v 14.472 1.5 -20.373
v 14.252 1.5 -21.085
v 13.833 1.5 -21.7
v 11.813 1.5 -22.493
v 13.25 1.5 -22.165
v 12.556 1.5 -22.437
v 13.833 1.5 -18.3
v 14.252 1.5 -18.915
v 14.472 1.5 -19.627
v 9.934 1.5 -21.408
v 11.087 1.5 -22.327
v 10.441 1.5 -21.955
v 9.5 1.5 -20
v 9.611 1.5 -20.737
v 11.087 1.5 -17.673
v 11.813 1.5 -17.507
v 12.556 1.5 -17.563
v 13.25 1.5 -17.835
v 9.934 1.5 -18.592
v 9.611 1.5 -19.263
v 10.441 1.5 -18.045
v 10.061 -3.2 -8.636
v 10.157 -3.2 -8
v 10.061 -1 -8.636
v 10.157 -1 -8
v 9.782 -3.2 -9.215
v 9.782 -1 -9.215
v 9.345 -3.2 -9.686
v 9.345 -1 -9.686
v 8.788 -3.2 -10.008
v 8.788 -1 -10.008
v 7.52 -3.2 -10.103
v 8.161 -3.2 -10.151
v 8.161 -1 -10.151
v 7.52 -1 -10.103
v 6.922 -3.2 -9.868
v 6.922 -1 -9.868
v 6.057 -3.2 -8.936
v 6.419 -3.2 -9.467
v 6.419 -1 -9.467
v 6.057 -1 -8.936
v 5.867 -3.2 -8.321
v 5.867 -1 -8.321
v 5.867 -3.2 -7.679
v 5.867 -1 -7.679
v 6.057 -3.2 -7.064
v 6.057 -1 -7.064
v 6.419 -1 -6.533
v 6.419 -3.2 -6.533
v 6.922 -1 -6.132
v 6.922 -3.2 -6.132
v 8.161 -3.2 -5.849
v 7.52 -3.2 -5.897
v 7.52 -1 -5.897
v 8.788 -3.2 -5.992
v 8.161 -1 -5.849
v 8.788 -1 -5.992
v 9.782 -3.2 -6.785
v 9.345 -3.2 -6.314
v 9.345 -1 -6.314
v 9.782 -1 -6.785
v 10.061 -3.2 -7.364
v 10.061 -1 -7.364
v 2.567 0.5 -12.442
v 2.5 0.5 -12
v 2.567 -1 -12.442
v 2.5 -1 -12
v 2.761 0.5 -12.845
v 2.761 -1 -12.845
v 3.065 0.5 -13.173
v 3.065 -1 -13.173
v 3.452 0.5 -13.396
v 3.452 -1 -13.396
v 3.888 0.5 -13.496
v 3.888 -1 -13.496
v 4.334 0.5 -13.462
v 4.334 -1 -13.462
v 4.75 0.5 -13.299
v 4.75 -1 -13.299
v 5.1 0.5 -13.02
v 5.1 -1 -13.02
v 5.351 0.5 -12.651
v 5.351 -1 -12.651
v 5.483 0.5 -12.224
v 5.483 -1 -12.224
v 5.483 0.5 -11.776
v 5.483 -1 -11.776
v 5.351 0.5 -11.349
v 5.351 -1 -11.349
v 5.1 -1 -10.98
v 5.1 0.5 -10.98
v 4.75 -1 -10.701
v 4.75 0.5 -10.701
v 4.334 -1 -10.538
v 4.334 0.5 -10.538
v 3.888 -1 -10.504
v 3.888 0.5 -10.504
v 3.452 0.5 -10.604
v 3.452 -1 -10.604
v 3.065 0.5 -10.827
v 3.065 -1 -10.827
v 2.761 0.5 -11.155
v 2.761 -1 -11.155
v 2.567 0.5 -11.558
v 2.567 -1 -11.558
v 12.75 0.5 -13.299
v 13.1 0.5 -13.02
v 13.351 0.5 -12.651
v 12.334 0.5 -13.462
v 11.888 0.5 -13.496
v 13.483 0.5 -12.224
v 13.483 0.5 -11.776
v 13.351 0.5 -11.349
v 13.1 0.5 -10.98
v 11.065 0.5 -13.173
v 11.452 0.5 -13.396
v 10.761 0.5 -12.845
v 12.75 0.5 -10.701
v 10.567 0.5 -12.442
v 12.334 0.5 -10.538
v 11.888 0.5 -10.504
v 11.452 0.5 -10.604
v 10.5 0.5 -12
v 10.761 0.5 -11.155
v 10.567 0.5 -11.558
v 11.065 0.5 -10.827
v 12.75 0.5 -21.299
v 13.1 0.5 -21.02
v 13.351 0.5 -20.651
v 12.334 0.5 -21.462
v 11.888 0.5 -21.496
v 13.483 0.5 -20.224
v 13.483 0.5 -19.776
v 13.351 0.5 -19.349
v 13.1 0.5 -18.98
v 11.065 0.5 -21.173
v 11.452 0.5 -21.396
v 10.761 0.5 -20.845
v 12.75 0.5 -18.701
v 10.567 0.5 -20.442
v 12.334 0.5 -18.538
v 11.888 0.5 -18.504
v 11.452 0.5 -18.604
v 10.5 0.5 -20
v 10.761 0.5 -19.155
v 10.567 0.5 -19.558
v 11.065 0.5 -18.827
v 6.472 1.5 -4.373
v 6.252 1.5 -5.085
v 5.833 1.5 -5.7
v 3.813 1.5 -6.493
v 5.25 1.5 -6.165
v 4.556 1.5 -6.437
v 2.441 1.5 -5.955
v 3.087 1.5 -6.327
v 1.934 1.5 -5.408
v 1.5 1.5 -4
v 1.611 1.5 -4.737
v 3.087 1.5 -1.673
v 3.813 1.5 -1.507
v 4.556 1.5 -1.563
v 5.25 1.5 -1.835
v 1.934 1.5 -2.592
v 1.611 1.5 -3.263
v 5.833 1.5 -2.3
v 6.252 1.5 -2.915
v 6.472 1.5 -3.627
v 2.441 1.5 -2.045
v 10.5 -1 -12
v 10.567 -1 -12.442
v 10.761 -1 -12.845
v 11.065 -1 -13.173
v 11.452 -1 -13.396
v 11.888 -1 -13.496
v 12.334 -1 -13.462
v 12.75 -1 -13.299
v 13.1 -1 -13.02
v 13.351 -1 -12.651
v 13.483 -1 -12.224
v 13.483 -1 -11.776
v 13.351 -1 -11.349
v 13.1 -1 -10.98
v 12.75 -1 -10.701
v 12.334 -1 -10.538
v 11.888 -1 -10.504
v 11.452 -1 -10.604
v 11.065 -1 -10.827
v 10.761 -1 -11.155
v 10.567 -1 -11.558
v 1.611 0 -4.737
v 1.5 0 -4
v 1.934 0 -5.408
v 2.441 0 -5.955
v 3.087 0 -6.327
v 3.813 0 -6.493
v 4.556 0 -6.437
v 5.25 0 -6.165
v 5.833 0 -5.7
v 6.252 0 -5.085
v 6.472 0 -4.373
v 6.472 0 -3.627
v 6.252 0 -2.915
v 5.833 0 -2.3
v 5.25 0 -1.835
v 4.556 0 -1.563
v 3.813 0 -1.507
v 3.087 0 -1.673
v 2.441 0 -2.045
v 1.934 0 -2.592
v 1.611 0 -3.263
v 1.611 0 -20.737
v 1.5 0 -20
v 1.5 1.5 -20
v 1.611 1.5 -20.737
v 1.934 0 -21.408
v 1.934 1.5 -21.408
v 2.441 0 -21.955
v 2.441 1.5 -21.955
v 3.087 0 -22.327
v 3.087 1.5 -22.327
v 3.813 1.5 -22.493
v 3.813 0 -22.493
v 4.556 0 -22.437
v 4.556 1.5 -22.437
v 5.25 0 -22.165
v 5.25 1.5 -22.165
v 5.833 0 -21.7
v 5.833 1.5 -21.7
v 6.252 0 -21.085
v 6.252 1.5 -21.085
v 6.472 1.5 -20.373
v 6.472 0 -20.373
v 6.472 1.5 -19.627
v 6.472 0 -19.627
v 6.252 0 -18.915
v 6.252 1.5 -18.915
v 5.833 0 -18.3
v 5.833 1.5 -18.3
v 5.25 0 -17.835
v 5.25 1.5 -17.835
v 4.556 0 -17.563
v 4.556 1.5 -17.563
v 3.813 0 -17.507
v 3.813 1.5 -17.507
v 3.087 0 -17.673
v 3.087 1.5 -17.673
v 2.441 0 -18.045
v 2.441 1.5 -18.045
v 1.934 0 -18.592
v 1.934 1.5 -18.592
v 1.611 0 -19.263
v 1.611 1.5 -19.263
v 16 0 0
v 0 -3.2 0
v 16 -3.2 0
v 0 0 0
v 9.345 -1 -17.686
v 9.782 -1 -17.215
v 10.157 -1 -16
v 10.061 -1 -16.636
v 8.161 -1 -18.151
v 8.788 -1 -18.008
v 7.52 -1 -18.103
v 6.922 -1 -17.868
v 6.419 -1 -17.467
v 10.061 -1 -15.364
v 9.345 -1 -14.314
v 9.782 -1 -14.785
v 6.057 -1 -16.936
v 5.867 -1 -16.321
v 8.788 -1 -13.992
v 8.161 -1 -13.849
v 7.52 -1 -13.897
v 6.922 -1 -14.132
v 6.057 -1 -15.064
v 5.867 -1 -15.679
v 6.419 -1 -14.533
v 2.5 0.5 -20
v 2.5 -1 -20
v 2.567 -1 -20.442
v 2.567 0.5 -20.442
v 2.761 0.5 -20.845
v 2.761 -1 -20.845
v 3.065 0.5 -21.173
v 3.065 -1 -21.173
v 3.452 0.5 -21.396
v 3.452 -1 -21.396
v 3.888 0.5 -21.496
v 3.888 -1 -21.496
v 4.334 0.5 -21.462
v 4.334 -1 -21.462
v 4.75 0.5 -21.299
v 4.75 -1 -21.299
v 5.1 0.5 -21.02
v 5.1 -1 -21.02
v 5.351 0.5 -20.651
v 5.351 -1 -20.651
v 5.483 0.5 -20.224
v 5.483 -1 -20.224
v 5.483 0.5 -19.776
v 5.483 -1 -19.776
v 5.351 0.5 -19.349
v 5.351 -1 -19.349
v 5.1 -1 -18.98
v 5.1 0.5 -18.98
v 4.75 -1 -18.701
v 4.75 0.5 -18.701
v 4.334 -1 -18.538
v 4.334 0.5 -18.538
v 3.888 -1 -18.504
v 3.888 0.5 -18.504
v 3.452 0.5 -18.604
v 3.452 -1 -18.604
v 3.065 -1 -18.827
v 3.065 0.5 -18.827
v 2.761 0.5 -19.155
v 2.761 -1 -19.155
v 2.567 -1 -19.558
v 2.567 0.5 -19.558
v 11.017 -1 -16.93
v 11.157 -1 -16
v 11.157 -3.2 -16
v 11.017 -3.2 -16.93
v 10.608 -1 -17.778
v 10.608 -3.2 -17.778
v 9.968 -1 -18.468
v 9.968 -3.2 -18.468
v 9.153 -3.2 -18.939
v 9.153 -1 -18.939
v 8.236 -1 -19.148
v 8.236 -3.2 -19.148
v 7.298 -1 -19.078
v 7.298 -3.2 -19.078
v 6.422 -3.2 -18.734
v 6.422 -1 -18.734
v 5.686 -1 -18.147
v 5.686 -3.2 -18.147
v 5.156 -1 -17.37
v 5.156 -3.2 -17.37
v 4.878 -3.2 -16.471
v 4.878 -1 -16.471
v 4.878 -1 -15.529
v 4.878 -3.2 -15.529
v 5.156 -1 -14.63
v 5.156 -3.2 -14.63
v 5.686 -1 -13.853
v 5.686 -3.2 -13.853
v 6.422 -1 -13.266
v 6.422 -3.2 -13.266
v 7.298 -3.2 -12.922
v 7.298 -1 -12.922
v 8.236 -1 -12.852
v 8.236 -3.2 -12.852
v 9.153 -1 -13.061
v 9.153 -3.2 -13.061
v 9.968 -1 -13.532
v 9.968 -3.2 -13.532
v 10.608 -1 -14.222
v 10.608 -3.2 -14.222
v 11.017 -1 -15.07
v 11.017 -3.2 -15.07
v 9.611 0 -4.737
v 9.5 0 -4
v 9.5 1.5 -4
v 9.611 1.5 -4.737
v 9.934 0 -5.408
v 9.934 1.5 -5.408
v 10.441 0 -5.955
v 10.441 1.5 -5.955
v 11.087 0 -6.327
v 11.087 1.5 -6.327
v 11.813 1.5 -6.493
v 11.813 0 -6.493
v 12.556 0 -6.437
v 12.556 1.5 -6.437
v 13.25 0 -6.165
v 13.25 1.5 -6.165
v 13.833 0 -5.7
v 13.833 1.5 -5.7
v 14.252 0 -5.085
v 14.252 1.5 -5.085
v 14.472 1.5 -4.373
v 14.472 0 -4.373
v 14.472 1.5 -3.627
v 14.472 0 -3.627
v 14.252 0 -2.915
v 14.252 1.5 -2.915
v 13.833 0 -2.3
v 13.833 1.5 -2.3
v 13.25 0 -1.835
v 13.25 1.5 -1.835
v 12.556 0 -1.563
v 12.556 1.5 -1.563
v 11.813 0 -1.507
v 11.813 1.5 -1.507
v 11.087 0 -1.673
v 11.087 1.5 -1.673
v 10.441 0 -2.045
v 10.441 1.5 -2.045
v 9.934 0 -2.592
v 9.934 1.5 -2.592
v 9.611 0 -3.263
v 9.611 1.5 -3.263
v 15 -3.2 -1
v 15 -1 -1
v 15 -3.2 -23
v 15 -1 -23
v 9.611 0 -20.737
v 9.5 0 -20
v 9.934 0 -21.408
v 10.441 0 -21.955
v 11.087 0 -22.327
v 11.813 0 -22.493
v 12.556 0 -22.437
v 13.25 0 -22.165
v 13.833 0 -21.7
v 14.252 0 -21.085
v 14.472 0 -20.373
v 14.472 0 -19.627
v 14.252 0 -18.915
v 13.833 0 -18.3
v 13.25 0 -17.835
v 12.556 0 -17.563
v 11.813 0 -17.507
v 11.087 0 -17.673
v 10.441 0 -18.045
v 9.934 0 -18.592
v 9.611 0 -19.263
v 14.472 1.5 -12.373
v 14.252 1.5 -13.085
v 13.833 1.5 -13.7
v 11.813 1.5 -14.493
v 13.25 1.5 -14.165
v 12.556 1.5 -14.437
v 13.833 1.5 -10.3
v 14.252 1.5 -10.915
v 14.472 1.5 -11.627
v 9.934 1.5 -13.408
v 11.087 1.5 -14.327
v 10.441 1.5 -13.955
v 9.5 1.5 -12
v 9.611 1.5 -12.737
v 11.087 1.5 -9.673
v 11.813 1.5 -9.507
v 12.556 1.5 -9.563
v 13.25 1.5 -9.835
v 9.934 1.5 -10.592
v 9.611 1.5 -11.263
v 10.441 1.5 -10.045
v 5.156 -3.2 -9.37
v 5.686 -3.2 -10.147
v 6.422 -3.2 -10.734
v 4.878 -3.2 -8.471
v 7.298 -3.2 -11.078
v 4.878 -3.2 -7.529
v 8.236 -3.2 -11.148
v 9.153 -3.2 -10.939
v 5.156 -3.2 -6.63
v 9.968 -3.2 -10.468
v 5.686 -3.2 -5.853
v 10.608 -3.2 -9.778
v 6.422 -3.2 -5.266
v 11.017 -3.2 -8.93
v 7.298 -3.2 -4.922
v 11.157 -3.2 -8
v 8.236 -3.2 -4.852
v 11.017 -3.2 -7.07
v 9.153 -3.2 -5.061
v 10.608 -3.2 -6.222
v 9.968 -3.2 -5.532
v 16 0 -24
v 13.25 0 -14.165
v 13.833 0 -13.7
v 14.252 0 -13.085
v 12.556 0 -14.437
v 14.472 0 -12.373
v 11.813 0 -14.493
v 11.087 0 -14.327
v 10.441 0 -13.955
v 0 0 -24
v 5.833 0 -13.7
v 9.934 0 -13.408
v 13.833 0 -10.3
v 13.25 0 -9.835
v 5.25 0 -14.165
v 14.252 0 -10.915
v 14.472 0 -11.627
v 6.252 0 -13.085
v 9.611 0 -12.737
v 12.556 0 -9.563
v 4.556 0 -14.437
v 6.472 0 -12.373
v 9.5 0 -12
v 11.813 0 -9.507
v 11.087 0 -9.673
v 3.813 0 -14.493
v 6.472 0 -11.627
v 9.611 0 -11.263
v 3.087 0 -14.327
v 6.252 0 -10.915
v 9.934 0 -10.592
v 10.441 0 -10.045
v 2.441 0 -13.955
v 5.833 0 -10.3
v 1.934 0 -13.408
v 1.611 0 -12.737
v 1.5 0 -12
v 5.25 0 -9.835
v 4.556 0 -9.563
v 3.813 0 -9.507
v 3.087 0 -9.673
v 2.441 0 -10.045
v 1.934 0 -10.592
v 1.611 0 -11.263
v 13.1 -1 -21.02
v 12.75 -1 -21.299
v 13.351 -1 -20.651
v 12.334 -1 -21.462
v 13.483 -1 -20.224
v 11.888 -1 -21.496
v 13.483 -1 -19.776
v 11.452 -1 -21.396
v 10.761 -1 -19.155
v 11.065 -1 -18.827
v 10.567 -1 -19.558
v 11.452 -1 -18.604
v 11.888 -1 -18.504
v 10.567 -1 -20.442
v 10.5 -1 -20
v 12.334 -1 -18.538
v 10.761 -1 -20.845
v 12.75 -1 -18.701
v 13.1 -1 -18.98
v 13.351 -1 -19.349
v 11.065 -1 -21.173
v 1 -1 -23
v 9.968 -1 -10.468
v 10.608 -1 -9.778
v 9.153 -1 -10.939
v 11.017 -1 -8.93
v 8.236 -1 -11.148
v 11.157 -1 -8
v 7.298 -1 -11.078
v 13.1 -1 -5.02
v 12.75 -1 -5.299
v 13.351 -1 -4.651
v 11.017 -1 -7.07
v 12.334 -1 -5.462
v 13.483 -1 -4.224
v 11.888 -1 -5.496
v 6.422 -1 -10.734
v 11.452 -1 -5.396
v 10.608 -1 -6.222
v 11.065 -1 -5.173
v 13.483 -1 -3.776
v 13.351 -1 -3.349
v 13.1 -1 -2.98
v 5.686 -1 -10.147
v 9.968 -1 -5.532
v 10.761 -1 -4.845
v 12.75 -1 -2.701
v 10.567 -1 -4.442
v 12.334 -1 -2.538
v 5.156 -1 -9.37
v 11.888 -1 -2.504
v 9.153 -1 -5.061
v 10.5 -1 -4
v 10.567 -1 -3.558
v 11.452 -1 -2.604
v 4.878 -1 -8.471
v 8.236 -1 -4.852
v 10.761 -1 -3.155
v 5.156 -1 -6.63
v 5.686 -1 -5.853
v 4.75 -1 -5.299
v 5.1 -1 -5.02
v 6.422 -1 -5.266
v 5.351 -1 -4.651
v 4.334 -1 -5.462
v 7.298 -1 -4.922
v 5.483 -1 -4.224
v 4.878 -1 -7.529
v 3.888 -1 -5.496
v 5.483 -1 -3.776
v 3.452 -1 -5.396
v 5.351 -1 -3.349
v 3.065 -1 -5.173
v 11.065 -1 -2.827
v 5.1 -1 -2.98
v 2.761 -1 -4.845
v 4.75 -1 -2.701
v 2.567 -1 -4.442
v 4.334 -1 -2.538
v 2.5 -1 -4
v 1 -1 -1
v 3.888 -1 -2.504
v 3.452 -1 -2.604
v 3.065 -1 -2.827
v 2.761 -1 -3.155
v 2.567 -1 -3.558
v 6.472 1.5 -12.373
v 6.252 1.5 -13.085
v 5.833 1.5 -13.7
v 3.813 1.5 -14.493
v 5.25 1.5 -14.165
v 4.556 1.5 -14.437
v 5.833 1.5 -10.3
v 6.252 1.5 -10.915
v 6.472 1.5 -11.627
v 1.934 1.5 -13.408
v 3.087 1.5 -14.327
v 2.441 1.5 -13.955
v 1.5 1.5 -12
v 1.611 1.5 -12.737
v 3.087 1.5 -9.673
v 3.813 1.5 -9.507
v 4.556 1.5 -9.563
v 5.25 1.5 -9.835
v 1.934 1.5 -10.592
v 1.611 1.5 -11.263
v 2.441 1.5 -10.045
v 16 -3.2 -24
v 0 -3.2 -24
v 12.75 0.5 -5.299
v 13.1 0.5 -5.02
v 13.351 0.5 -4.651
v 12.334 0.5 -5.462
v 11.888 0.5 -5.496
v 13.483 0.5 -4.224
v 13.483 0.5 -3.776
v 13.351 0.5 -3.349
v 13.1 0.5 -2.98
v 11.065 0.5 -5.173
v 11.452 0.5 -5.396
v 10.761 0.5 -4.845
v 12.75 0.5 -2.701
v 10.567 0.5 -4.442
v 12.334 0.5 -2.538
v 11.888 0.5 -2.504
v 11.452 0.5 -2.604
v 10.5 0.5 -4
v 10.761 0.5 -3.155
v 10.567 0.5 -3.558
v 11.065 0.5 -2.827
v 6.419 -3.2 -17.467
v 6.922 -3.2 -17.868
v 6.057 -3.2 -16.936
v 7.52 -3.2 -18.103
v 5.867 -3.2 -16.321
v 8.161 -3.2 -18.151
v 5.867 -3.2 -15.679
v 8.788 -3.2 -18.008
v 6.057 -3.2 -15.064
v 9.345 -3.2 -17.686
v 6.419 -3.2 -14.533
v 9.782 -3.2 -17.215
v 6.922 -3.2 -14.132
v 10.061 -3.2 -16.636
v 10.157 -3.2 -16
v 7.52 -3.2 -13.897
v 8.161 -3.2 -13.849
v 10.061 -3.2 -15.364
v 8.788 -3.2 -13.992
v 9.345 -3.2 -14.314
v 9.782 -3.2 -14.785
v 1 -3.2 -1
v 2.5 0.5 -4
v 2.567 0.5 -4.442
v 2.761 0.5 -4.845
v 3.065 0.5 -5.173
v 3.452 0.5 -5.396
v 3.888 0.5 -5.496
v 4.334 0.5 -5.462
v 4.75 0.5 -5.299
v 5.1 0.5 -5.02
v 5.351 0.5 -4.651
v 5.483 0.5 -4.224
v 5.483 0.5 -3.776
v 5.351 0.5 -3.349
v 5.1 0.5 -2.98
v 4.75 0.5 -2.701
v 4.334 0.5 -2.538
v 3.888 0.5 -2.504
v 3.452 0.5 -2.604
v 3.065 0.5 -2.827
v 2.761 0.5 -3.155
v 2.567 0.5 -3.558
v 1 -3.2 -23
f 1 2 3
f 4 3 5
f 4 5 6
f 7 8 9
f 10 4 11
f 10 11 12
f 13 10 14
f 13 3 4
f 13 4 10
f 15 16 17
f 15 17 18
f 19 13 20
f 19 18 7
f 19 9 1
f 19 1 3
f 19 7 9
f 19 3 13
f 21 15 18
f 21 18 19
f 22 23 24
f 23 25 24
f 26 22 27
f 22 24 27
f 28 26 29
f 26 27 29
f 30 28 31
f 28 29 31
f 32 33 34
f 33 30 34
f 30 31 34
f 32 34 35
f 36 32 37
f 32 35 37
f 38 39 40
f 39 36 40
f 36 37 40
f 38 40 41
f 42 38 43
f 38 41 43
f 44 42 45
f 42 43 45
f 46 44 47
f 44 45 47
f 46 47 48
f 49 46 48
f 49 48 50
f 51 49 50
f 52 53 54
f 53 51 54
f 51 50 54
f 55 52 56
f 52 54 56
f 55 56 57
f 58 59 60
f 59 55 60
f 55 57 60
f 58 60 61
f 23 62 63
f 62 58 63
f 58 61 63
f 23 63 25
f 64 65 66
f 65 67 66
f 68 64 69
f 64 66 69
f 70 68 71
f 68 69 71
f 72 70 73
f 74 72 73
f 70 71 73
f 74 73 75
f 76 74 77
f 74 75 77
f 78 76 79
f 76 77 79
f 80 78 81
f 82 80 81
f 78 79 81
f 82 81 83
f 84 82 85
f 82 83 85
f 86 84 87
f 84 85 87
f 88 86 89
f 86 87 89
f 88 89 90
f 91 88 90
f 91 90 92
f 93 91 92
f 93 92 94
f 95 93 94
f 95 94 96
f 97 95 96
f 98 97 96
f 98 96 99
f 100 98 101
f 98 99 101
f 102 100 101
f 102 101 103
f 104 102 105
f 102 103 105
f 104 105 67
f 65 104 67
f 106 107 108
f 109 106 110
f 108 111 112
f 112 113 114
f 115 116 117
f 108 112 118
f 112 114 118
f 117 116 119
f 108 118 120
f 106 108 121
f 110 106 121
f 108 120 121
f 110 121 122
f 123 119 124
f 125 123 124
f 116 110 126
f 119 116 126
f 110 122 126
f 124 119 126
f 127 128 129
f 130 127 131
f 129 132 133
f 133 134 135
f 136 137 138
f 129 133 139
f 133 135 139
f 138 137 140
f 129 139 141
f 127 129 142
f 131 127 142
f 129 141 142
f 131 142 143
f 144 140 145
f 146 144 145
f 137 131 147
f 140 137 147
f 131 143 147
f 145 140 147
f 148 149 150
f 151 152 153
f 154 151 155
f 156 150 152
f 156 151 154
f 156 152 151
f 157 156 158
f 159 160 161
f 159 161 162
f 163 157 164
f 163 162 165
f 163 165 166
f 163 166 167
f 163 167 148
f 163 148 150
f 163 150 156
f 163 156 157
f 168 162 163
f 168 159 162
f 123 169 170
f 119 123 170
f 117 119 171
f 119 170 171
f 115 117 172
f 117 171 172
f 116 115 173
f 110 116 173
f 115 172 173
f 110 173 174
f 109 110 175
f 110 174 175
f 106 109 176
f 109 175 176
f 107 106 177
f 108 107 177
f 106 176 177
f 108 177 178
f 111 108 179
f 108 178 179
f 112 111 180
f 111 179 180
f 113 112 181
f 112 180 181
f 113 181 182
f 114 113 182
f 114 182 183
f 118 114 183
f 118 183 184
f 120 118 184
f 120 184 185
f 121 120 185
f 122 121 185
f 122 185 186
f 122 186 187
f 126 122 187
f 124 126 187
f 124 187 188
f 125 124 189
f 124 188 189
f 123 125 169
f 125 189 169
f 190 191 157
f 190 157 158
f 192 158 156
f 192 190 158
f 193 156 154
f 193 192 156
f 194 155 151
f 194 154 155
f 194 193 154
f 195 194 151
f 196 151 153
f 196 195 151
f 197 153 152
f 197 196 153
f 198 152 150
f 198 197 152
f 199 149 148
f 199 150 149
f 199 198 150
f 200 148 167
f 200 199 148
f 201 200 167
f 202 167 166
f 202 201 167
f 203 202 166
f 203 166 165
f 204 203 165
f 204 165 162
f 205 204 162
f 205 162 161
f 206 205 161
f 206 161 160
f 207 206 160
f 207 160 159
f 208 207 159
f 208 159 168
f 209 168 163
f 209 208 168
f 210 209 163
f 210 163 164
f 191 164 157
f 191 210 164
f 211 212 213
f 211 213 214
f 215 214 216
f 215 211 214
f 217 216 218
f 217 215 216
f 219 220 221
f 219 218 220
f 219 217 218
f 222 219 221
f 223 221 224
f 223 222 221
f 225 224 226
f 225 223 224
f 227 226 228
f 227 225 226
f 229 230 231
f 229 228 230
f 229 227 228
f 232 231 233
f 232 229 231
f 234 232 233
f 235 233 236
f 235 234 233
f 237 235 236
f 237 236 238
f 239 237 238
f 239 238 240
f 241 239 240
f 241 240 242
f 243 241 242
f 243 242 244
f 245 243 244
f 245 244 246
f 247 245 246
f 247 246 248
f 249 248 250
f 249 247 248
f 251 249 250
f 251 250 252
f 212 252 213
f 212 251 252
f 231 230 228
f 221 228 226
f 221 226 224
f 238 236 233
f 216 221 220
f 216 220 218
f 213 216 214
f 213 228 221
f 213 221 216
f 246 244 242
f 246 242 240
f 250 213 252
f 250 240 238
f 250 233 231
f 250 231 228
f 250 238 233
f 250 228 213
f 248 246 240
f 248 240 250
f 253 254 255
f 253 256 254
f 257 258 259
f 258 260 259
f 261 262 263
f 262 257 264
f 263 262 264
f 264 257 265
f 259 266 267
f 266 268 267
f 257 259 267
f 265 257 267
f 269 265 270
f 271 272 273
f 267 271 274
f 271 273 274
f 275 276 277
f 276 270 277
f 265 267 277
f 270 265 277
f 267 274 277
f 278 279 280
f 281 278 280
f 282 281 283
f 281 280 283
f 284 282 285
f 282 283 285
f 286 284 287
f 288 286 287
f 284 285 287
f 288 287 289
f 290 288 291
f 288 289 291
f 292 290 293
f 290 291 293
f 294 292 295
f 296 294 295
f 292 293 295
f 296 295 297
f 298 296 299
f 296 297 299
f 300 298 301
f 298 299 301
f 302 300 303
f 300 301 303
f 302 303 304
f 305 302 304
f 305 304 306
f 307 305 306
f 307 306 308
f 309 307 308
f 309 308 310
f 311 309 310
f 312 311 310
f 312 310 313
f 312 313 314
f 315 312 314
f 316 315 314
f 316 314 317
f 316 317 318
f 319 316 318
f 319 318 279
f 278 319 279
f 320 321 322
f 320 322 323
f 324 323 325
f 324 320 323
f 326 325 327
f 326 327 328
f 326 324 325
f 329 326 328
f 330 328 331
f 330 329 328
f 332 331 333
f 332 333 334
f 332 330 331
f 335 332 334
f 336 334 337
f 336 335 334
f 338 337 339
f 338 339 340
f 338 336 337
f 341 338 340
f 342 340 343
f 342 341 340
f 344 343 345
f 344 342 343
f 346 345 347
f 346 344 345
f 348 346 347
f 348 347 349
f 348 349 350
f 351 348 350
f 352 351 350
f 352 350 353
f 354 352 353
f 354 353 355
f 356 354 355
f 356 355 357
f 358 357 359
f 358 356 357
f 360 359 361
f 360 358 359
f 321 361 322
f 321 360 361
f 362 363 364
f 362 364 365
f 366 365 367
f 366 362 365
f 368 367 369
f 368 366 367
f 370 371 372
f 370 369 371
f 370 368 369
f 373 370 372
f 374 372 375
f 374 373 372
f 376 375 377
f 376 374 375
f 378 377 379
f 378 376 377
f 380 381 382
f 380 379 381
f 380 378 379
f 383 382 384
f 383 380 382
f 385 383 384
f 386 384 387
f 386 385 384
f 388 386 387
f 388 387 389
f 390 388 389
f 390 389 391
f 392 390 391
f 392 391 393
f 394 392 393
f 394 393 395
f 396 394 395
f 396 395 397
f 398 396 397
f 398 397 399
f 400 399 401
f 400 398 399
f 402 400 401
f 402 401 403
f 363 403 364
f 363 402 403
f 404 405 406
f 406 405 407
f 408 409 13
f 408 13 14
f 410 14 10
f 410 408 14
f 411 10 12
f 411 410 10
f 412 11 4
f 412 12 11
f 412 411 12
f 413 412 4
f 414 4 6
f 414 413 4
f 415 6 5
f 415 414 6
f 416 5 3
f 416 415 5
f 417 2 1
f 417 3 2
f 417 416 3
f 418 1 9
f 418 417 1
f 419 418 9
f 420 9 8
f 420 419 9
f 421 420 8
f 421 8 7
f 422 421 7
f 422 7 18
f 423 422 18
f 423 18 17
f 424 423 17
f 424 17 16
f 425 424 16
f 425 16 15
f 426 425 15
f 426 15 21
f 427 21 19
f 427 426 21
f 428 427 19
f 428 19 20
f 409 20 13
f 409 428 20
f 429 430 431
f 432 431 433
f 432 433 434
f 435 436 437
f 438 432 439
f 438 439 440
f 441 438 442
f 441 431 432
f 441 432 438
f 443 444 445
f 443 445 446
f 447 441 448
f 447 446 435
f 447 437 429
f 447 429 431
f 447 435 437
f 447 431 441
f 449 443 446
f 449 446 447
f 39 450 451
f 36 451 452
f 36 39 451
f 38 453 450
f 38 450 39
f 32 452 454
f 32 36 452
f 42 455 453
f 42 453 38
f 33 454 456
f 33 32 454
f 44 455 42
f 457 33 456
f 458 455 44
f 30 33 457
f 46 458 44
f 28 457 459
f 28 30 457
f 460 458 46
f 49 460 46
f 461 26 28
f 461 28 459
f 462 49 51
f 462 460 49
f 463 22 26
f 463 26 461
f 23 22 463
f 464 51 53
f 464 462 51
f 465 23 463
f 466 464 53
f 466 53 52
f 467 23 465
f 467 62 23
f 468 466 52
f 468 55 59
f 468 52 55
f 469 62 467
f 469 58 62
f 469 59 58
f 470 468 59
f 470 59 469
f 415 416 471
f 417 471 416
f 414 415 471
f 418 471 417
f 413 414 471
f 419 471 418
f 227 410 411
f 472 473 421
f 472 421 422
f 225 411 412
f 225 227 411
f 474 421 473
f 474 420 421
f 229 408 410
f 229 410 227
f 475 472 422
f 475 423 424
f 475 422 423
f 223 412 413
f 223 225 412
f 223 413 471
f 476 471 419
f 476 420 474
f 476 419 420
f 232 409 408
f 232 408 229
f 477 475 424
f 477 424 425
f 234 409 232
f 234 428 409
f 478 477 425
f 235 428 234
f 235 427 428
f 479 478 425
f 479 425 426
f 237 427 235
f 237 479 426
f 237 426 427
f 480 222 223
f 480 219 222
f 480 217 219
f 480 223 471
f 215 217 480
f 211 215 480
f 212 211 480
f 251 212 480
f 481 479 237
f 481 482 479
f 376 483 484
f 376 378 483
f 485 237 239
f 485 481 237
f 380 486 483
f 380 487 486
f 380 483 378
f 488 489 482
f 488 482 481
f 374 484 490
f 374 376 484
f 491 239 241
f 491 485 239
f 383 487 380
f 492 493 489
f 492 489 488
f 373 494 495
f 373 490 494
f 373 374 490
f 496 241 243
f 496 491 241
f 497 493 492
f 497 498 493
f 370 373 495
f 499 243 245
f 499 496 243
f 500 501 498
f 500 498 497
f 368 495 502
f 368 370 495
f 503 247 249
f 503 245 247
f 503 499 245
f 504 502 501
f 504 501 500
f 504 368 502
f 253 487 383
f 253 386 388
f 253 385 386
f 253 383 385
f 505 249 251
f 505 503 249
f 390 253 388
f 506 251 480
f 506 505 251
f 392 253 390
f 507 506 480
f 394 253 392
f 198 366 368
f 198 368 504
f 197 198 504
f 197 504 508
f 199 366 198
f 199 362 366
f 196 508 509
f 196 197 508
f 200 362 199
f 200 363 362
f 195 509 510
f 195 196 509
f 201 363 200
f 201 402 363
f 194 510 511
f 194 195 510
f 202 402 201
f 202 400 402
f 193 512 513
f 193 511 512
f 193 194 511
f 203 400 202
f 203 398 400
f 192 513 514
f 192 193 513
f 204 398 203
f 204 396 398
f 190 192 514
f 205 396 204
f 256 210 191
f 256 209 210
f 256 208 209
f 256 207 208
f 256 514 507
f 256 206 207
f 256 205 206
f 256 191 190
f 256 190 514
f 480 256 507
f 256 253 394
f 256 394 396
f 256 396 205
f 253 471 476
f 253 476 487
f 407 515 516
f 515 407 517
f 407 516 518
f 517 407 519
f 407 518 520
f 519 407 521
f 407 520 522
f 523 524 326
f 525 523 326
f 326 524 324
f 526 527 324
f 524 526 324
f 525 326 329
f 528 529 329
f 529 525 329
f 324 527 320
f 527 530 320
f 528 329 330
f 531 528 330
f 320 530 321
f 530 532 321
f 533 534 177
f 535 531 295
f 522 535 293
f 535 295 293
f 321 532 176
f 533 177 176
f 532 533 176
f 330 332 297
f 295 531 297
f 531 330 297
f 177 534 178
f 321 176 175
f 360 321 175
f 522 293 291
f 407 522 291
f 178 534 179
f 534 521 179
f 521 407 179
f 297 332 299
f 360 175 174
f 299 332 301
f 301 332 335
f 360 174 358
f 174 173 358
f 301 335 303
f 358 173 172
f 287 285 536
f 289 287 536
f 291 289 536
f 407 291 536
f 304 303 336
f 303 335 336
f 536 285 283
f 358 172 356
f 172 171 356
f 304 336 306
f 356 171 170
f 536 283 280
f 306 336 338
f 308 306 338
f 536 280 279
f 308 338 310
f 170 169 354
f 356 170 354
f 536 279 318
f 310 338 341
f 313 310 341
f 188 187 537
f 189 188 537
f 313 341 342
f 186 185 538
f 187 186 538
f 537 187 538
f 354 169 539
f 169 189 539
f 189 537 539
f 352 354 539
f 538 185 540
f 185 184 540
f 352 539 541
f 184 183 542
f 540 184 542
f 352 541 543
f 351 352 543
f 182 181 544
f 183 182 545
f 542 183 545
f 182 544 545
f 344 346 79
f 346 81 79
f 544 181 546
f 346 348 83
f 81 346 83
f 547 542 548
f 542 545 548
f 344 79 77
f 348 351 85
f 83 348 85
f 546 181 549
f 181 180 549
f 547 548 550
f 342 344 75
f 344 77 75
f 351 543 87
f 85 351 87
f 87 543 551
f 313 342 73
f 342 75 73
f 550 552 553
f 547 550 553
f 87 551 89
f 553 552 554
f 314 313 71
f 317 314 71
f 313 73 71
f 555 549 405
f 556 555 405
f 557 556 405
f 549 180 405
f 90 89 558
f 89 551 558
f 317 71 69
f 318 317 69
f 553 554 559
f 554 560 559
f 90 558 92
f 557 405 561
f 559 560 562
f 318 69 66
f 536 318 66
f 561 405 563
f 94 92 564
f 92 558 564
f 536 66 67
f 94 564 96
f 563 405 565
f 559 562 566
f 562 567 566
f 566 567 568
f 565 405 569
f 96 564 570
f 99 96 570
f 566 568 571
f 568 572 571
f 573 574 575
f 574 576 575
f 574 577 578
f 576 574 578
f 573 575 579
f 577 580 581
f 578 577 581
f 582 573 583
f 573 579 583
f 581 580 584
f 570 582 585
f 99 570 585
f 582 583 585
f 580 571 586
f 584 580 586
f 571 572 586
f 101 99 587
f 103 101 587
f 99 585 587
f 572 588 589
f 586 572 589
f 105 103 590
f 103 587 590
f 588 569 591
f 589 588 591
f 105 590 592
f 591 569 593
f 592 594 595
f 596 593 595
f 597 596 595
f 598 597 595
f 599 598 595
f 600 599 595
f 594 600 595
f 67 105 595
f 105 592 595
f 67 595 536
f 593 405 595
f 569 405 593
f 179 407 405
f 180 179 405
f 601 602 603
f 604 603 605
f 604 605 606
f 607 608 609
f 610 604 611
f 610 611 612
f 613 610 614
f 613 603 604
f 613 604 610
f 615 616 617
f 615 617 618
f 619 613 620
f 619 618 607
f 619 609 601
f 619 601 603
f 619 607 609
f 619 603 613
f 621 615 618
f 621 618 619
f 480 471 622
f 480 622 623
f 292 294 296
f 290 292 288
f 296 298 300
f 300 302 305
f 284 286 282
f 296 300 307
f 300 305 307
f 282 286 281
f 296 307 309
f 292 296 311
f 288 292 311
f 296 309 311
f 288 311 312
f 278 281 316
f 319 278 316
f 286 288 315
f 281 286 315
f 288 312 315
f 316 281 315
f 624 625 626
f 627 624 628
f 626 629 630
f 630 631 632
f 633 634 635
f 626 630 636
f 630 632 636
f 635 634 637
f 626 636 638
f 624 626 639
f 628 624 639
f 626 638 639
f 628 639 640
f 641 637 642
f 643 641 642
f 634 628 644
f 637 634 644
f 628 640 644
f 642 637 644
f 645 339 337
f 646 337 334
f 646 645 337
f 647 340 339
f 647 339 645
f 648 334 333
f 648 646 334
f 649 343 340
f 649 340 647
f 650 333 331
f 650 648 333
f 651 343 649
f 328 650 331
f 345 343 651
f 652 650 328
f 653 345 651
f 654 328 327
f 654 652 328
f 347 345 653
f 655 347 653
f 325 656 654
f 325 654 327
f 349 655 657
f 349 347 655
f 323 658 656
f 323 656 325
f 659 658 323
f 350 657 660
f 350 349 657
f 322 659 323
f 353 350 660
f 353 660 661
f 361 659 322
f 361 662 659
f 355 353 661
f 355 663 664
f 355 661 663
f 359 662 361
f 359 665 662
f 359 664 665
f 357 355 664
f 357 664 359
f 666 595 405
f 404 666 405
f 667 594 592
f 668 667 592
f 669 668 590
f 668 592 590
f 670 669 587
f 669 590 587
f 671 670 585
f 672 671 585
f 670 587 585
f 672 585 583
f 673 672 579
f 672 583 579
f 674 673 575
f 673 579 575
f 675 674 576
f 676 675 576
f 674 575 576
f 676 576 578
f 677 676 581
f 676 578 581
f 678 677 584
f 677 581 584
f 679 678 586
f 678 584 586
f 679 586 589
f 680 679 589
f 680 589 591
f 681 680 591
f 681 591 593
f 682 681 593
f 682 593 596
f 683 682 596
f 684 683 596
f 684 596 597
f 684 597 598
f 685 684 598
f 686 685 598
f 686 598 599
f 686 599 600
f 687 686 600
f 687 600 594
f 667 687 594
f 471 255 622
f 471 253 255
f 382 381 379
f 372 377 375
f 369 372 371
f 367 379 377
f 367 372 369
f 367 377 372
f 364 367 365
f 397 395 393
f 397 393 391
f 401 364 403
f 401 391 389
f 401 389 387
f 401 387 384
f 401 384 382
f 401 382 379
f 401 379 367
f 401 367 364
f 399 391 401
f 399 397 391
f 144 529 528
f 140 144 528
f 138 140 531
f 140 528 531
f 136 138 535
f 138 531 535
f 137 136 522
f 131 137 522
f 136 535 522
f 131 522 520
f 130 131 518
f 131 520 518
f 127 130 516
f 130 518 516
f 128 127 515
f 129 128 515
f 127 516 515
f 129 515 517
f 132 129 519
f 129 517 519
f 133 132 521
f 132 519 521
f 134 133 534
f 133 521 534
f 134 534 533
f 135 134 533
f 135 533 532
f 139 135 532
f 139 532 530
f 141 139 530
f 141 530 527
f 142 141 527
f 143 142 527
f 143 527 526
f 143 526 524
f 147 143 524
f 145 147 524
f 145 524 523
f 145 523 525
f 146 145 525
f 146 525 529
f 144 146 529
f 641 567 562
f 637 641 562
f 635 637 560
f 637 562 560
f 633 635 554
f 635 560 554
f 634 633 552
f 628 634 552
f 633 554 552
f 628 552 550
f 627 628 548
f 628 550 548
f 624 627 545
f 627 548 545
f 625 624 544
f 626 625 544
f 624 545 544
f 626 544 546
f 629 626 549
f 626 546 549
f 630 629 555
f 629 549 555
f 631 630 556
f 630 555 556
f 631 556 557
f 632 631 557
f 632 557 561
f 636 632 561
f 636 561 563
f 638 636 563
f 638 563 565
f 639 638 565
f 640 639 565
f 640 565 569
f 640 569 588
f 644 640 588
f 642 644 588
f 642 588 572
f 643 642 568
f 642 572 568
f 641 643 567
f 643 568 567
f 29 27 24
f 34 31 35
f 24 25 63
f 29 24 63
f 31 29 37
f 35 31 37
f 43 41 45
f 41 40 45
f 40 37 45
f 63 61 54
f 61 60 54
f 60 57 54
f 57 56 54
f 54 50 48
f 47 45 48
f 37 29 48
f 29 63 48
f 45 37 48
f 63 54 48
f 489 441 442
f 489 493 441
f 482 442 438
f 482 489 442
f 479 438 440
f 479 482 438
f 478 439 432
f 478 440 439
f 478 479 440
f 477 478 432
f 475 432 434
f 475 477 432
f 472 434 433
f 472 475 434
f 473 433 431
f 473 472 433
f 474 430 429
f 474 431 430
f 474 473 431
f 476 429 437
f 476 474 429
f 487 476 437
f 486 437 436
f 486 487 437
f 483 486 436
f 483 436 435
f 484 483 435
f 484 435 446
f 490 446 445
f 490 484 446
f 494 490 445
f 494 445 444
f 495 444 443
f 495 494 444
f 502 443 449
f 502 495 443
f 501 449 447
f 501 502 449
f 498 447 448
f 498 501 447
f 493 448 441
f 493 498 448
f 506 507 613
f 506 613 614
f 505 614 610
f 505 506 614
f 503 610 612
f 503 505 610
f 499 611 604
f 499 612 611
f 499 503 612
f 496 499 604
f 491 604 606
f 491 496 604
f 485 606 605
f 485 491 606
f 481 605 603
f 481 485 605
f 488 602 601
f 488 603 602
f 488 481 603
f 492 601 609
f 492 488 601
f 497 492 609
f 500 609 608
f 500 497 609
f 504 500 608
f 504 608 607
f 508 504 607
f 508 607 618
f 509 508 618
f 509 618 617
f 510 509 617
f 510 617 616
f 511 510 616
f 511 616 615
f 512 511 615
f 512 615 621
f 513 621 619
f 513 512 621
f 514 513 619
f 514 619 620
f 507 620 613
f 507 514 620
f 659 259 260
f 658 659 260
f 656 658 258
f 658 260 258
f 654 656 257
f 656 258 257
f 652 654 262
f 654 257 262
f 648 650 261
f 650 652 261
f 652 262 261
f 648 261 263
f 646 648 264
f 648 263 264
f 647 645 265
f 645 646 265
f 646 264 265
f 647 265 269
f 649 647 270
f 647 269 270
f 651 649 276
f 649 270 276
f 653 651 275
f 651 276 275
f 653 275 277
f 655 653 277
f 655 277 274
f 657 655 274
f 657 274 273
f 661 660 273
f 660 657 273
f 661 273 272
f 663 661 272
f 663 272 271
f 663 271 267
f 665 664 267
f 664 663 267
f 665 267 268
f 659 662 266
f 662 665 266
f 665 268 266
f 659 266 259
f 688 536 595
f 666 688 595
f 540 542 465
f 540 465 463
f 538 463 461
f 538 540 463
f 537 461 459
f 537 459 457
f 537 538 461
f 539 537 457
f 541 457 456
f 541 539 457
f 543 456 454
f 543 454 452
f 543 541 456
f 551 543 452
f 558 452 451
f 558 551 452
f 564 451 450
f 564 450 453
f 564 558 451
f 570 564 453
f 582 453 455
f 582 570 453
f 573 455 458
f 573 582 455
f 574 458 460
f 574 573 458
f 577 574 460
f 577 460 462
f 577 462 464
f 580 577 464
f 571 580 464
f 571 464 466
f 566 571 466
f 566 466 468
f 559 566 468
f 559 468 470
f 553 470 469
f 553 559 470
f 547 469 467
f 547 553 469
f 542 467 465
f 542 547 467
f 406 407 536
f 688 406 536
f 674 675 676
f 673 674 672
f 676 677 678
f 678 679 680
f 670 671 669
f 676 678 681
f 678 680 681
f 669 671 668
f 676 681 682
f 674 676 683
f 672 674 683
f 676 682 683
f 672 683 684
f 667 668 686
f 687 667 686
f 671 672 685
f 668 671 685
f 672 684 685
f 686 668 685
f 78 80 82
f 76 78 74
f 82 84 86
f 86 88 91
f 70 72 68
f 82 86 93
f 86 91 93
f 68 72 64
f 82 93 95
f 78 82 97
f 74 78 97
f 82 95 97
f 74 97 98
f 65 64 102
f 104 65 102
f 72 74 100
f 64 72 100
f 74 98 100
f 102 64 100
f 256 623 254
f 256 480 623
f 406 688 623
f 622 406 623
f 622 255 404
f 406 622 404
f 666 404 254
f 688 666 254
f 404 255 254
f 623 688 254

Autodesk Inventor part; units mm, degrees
ref_plane "YZ Plane" through (0, 0, 0) normal (1, 0, 0) x (0, 1, 0)
ref_plane "XZ Plane" through (0, 0, 0) normal (0, 1, 0) x (-1, 0, 0)
ref_plane "XY Plane" through (0, 0, 0) normal (0, 0, 1) x (1, 0, 0)
sketch "草圖1" plane through (0, 0, 0) normal (0, 1, 0) x (-1, 0, 0)
  line L0 (0, 0) -> (-16, 0)
  line L1 (-16, 0) -> (-16, -24)
  line L2 (-16, -24) -> (0, -24)
  line L3 (0, -24) -> (0, 0)
  dimension "長" = 16
  dimension "寬" = 24
extrude "樂高擠出" add sketch "草圖1" against normal blind 3.2
sketch "草圖2" plane through (0, 0, 0) normal (0, 1, 0) x (-1, 0, 0)
  circle A0 centre (-12, -4) radius 2.5
  line L0 (-16, 0) -> (-16, -24) projected
  line L1 (0, 0) -> (-16, 0) projected
  dimension "d4" = 5
  dimension "d5" = 4
  dimension "d6" = 4
extrude "圓柱擠出" add sketch "草圖2" along normal blind 1.5
pattern_linear "頂部圓柱" count 3 spacing 8 along (0, 0, -1) count 2 spacing 8 along (-1, 0, 0) of "圓柱擠出"
shell "薄殼2" thickness 1 removed faces 1 at (10.666667, -3.2, -16)
sketch "草圖6" plane through (1, -1, -1) normal (0, -1, 0) x (1, 0, 0)
  circle A0 centre (3, -19) radius 1.5
  circle A1 centre (3, -11) radius 1.5
  circle A2 centre (3, -3) radius 1.5
  circle A3 centre (11, -19) radius 1.5
  circle A4 centre (11, -11) radius 1.5
  circle A5 centre (11, -3) radius 1.5
  line L0 (14, 0) -> (14, -22)
  line L1 (0, 0) -> (14, 0)
  line L2 (0, -22) -> (0, 0)
  line L3 (14, -22) -> (0, -22)
  circle A6 centre (7, -7) radius 3.156854
  circle A7 centre (11, -11) radius 2.5
  circle A8 centre (11, -3) radius 2.5
  circle A9 centre (3, -3) radius 2.5
  circle A10 centre (7, -7) radius 2.156854
  point P0 (-1, 1)
  dimension "d41" = 1
extrude "擠出7" add sketch "草圖6" along normal up to surface (2.2 mm away) contours A6
pattern_linear "矩形陣列3" count 2 spacing 8 along (0, 0, -1) of "擠出7"
properties part number "0401_練習"
